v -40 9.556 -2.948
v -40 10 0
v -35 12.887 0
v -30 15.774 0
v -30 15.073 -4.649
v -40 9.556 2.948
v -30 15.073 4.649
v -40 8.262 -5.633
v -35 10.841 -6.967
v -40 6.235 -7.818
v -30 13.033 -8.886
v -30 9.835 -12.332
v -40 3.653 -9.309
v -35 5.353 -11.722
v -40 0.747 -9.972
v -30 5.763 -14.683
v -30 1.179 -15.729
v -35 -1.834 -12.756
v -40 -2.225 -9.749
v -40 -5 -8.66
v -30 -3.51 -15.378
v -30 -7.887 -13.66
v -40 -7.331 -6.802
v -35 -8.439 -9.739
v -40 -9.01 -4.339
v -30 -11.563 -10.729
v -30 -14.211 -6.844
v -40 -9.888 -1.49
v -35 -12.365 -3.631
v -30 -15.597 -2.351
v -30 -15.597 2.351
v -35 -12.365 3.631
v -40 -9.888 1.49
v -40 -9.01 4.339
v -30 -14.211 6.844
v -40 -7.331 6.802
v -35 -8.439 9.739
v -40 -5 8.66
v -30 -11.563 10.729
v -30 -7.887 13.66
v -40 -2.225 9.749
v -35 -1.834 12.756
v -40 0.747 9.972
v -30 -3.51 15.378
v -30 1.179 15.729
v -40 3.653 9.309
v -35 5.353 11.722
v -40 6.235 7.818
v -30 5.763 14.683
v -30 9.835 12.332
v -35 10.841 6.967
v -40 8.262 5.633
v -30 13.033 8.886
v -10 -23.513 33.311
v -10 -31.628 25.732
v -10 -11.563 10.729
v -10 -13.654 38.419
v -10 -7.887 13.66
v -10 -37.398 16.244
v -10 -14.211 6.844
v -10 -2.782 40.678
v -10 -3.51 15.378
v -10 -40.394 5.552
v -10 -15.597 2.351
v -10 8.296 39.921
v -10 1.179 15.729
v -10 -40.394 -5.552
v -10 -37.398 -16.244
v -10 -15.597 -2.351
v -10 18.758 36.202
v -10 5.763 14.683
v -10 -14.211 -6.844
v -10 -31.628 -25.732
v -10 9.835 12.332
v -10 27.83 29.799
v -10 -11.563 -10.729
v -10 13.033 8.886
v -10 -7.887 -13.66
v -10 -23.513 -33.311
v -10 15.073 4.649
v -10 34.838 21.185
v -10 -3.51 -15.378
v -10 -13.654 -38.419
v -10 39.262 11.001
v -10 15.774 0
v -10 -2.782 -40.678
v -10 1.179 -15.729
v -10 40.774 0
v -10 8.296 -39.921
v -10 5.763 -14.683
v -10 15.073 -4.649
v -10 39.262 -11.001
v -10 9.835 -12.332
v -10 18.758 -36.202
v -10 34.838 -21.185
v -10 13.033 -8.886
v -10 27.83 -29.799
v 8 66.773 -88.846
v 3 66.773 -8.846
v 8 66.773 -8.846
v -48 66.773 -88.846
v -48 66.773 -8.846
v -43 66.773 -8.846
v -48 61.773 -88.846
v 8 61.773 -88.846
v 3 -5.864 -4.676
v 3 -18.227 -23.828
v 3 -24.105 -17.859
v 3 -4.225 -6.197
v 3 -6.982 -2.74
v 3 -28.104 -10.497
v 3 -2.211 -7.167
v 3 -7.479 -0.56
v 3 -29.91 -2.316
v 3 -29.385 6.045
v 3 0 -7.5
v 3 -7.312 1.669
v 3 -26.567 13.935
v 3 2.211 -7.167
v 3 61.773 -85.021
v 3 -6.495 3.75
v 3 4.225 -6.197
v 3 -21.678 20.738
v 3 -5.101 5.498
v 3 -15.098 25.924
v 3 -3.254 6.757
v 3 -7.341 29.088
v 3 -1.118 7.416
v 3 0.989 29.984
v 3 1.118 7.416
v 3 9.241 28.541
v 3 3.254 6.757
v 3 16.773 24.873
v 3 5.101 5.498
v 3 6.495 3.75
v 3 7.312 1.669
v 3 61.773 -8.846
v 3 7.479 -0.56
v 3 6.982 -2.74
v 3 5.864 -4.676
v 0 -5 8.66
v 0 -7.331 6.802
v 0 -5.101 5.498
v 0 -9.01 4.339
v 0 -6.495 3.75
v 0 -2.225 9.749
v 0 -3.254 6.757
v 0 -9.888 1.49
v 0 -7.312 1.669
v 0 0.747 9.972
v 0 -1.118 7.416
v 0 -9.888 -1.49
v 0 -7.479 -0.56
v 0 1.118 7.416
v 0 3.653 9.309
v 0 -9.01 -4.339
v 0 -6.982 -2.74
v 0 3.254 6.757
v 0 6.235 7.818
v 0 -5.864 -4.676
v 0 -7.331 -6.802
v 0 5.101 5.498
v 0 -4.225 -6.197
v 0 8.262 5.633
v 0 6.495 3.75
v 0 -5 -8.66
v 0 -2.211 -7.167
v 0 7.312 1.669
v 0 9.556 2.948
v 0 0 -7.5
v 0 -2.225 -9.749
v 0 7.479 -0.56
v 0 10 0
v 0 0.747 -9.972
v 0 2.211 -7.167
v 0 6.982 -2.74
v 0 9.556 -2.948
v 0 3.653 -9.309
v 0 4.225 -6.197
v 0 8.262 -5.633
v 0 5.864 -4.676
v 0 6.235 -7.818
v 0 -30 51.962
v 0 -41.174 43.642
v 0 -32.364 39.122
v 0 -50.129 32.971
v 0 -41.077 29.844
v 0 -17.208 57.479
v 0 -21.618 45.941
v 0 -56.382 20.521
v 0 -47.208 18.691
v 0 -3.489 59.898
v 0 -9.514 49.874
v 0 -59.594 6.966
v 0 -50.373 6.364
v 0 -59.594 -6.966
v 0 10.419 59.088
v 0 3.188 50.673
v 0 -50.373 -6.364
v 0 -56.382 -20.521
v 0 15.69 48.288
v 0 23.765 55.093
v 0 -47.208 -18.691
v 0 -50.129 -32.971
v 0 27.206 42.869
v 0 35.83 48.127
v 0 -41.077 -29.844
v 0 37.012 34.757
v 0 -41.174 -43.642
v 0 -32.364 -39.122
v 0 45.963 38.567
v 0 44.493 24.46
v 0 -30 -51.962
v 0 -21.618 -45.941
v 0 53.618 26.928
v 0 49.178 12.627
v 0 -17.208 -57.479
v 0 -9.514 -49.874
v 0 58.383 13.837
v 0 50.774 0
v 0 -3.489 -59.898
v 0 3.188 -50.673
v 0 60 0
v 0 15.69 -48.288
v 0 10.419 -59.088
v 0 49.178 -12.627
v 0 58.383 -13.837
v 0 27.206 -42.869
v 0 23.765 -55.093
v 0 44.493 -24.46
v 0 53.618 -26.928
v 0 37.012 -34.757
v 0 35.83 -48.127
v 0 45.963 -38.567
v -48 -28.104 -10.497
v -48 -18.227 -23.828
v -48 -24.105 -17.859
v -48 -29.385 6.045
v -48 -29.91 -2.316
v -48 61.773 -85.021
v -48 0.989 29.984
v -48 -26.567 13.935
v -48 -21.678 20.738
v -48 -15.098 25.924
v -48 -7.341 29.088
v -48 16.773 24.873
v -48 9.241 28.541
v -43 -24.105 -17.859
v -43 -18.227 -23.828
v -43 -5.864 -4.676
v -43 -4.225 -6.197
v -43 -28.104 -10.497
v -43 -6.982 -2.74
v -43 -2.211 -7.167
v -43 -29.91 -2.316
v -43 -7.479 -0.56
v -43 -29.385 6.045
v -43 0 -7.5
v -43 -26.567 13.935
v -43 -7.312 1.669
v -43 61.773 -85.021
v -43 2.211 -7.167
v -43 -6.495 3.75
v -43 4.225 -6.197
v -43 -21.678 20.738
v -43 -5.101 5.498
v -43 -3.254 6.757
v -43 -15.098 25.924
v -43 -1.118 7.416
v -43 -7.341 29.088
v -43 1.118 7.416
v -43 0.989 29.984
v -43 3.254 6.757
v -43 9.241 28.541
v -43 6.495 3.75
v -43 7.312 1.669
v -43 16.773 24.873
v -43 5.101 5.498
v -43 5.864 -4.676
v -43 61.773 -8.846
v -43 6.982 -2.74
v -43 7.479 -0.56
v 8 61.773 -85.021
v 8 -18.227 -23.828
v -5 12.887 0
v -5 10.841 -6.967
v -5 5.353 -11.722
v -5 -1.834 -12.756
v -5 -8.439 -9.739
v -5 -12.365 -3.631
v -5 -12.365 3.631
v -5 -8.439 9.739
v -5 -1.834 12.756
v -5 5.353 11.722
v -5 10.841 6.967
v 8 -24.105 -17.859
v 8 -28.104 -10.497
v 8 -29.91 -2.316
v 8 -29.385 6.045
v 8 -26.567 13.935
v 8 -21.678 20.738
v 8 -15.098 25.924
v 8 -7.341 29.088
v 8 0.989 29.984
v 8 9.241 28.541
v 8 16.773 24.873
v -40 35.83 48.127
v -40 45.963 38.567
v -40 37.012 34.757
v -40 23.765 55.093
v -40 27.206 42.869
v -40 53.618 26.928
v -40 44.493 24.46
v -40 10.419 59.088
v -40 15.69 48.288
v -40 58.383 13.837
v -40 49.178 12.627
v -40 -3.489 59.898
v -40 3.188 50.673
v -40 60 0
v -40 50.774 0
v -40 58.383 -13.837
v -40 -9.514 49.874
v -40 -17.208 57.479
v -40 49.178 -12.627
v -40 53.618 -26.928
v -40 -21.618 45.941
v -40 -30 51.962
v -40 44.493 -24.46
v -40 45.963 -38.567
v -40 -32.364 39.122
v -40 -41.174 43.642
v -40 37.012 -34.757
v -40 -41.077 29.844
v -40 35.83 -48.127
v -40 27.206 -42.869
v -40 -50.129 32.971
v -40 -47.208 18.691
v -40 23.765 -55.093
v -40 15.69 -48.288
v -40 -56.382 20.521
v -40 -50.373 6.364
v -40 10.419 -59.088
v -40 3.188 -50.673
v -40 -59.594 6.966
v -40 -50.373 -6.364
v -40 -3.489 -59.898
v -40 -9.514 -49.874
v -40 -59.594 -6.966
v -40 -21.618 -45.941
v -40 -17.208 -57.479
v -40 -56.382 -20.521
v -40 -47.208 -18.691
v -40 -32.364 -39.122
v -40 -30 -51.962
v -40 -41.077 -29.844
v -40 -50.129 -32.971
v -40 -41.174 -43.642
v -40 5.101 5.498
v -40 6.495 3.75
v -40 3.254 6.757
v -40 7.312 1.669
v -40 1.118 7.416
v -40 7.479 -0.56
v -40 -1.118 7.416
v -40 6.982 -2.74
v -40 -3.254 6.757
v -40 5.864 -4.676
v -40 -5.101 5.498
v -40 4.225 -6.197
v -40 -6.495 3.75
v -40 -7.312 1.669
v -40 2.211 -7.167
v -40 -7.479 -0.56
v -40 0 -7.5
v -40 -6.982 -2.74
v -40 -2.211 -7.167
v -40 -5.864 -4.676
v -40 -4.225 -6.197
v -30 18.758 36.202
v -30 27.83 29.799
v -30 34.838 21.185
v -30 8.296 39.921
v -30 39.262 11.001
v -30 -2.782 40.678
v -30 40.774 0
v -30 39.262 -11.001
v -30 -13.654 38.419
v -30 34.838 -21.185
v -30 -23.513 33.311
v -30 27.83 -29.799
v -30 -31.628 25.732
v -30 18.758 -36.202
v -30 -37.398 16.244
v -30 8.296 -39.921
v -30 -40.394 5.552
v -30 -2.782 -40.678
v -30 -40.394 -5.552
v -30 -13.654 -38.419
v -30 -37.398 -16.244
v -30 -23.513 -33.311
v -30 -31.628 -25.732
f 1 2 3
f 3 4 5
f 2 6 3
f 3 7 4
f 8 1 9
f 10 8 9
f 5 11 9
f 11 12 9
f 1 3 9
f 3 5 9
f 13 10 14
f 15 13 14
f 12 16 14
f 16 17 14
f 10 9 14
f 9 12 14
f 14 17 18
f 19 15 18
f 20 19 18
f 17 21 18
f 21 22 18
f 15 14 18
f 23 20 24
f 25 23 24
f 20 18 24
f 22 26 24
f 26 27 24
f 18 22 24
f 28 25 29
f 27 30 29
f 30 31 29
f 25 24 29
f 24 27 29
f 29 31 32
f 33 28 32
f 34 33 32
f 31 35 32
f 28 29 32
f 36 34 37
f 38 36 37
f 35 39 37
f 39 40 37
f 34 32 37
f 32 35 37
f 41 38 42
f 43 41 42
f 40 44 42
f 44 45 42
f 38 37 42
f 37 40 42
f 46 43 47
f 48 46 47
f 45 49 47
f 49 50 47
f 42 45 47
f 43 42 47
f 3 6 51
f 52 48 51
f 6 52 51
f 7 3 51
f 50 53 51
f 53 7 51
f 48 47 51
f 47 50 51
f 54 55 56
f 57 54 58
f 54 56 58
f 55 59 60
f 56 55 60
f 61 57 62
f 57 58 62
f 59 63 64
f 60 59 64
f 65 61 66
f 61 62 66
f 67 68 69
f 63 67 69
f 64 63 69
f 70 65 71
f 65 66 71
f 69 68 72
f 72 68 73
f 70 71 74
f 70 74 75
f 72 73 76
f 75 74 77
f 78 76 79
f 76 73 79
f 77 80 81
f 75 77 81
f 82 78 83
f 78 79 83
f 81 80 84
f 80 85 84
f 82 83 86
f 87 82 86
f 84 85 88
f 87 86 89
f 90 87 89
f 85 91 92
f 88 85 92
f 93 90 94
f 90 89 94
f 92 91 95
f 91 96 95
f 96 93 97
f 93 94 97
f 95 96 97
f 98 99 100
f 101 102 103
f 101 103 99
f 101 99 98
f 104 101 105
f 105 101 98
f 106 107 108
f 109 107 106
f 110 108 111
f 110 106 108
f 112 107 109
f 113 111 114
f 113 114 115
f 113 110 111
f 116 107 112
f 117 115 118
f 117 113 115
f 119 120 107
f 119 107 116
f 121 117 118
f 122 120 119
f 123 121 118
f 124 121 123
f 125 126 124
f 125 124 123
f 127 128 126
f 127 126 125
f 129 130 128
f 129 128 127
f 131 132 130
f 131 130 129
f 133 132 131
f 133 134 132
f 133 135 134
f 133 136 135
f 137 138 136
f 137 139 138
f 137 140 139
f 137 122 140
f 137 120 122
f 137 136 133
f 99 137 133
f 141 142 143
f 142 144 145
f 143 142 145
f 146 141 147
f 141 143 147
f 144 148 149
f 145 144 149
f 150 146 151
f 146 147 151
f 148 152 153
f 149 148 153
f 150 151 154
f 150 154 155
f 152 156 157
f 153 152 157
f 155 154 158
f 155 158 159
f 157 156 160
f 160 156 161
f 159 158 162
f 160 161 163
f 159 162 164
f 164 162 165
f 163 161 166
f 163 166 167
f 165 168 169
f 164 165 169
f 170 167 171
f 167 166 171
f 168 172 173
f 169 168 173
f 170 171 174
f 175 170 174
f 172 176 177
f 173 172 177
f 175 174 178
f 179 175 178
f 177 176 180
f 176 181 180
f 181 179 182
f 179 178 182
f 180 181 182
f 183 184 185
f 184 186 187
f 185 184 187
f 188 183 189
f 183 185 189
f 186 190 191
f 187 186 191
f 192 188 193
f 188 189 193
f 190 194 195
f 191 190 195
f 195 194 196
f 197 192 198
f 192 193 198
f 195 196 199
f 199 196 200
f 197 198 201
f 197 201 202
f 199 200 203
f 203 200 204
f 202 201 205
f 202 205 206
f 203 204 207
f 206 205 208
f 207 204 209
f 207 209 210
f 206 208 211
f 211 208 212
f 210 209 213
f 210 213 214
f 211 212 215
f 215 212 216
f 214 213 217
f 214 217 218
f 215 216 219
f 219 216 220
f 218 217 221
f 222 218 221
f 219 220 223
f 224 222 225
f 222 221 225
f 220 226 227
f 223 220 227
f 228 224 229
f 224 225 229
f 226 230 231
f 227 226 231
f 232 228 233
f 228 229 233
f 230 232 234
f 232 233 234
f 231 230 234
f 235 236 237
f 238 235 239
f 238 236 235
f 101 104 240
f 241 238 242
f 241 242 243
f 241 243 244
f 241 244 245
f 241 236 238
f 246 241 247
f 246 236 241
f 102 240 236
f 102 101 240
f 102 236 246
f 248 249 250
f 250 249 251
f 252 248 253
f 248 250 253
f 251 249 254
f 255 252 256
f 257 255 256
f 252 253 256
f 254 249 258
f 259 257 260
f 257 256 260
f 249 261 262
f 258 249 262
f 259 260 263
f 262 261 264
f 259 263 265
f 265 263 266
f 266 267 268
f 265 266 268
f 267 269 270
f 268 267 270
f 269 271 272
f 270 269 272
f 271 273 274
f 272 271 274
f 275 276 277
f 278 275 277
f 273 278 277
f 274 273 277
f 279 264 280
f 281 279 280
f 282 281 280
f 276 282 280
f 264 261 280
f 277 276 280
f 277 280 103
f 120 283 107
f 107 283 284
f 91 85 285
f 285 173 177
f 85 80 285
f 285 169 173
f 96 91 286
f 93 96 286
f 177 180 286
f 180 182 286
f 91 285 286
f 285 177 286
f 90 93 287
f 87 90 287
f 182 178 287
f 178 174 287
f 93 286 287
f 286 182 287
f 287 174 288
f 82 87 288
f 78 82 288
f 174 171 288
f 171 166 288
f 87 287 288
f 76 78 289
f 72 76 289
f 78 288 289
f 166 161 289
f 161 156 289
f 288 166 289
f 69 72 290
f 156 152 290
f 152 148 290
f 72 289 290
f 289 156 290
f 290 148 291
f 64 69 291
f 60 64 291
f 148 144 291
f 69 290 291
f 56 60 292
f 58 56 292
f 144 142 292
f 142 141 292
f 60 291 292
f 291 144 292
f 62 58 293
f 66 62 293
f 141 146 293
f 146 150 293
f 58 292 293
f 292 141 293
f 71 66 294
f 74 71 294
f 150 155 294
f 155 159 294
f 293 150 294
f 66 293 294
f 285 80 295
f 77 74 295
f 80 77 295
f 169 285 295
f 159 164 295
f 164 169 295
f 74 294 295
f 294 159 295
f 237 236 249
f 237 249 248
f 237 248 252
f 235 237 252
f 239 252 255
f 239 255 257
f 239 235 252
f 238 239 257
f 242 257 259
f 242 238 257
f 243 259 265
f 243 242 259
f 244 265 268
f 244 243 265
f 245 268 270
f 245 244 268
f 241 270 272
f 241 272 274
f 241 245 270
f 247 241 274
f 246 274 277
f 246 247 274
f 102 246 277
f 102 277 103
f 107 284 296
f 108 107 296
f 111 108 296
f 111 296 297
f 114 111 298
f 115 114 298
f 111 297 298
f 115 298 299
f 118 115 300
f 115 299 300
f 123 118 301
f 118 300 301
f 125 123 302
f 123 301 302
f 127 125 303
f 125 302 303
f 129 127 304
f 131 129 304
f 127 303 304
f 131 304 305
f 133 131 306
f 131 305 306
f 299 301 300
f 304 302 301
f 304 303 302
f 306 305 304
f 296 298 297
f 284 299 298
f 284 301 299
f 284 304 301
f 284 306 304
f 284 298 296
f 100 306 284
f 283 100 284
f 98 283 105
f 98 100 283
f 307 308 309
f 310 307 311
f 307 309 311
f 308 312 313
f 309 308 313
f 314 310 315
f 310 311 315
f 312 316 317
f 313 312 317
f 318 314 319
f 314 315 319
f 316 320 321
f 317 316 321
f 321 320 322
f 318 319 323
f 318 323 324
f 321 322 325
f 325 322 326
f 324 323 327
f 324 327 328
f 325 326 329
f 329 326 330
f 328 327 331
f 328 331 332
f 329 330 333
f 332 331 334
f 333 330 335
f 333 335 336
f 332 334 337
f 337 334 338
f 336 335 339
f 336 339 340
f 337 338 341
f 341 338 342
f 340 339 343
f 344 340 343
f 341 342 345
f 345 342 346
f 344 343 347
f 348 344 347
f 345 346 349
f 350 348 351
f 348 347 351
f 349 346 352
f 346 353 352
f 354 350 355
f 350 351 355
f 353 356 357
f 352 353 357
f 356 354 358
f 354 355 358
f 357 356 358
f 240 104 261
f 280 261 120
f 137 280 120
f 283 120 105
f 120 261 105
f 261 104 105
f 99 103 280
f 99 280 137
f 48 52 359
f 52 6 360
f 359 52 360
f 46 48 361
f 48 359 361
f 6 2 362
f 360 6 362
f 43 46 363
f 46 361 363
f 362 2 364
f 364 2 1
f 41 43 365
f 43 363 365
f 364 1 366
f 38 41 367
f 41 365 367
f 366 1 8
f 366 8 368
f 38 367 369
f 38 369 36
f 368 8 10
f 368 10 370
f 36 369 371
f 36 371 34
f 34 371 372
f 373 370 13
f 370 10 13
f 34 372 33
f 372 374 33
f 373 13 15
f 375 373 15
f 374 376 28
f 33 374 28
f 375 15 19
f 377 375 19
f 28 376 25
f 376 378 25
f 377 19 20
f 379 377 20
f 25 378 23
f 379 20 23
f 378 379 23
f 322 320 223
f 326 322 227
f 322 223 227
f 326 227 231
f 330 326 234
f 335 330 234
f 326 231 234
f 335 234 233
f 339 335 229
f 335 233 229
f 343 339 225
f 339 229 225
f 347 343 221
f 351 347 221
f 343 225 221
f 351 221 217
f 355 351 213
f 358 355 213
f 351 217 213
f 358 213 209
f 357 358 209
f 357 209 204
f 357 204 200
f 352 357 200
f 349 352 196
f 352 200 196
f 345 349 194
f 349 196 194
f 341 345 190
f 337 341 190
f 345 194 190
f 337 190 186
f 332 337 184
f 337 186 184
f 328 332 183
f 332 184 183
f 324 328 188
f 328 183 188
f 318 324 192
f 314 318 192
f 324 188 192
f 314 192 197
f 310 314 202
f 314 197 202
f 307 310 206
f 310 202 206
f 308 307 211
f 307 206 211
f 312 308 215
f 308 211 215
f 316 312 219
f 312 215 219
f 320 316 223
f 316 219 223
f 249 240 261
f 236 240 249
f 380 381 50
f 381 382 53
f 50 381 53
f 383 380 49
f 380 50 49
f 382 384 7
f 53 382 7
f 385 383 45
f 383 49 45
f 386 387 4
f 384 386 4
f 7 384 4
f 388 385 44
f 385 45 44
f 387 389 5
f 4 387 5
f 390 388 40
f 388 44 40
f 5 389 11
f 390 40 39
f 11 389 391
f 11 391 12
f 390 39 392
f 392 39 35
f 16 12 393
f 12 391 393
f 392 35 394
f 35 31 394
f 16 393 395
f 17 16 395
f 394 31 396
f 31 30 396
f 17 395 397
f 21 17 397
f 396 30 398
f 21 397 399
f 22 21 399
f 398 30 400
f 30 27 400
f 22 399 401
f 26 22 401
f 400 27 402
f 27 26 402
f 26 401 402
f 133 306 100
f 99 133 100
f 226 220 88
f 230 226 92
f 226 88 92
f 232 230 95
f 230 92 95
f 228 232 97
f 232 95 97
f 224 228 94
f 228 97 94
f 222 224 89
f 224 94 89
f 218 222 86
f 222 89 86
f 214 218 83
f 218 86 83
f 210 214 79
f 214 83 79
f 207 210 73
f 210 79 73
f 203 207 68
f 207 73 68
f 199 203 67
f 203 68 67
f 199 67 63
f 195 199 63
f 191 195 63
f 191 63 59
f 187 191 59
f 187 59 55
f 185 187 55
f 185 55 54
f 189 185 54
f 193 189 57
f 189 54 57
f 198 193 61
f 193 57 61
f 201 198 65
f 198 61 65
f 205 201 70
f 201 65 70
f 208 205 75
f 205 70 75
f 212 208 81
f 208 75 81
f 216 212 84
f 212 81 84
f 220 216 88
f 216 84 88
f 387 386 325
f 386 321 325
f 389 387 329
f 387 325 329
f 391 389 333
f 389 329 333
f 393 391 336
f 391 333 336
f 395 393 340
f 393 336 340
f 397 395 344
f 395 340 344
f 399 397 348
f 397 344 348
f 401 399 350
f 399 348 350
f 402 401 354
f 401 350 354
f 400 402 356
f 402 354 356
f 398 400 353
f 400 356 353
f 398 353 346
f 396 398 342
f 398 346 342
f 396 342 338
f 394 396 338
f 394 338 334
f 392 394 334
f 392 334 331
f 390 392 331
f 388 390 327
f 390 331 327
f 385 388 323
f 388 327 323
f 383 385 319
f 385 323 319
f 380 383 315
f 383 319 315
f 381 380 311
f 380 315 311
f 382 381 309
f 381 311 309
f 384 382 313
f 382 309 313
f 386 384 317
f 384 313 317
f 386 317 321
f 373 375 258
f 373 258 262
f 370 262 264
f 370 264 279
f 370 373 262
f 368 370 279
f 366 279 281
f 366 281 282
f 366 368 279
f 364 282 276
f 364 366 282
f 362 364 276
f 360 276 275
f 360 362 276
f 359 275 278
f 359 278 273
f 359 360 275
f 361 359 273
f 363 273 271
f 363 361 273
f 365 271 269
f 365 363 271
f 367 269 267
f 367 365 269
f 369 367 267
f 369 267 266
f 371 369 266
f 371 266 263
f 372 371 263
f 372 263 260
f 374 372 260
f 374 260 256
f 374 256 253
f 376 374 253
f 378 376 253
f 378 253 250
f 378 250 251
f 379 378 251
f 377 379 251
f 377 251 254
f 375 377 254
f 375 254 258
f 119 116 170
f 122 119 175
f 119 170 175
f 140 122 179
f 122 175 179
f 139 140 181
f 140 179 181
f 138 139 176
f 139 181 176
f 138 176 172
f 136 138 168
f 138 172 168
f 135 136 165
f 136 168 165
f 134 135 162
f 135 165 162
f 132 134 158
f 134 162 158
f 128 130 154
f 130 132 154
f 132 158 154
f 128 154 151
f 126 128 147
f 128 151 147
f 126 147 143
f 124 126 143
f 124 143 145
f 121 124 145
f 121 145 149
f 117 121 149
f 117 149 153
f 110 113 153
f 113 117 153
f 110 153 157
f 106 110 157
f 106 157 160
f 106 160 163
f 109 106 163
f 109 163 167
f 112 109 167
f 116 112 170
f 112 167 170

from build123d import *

# Parameters (mm, degrees)
SKETCH3_R           = 7.5
BOSS_EXTRUDE1_DEPTH = 8
BOSS_EXTRUDE2_DEPTH = 5
SKETCH5_W           = 56
SKETCH5_H           = 80
BOSS_EXTRUDE3_DEPTH = 5


with BuildPart() as part:
    # Sketch1 → Revolve1 (revolve)
    with BuildSketch(Plane.XY):
        Polygon((-40, 60), (0, 60), (0, 50.773502692), (-10, 40.773502692), (-10, 15.773502692), (0, 10), (0, 0), (-40, 0), (-40, 10), (-30, 15.773502692), (-30, 40.773502692), (-40, 50.773502692), align=None)
    revolve(axis=Axis((0, 0, 0), (-1, 0, 0)))

    # Sketch3 → Boss-Extrude1 (add)
    with BuildSketch(Plane(origin=(0, 0, 0), x_dir=(0, 0, -1), z_dir=(1, 0, 0))):
        Circle(SKETCH3_R)
    boss_extrude1 = extrude(amount=BOSS_EXTRUDE1_DEPTH)

    # Sketch4 → Boss-Extrude2 (add)
    with BuildSketch(Plane(origin=(8, 0, 0), x_dir=(0, 0, -1), z_dir=(1, 0, 0))):
        with BuildLine():
            Line((8.84577787, 66.773419664), (88.84577787, 66.773419664))
            Line((88.84577787, 66.773419664), (23.828381591, -18.226580336))
            ThreePointArc((23.828381591, -18.226580336), (-17.50778863, -24.361390299), (-24.872723871, 16.773419664))
            Line((-24.872723871, 16.773419664), (8.84577787, 66.773419664))
        make_face()
    boss_extrude2 = extrude(amount=-BOSS_EXTRUDE2_DEPTH)

    # Mirror1: Boss-Extrude1, Boss-Extrude2 across plane
    add(boss_extrude1.mirror(Plane(origin=(-20, 0, 0), x_dir=(0, 0, 1), z_dir=(1, 0, 0))))
    add(boss_extrude2.mirror(Plane(origin=(-20, 0, 0), x_dir=(0, 0, 1), z_dir=(1, 0, 0))))

    # Sketch5 → Boss-Extrude3 (add)
    with BuildSketch(Plane(origin=(0, 66.773419664, 0), x_dir=(1, 0, 0), z_dir=(0, 1, 0))):
        with Locations((-20, 48.84577787)):
            Rectangle(SKETCH5_W, SKETCH5_H)
    extrude(amount=-BOSS_EXTRUDE3_DEPTH)


solid = part.part
